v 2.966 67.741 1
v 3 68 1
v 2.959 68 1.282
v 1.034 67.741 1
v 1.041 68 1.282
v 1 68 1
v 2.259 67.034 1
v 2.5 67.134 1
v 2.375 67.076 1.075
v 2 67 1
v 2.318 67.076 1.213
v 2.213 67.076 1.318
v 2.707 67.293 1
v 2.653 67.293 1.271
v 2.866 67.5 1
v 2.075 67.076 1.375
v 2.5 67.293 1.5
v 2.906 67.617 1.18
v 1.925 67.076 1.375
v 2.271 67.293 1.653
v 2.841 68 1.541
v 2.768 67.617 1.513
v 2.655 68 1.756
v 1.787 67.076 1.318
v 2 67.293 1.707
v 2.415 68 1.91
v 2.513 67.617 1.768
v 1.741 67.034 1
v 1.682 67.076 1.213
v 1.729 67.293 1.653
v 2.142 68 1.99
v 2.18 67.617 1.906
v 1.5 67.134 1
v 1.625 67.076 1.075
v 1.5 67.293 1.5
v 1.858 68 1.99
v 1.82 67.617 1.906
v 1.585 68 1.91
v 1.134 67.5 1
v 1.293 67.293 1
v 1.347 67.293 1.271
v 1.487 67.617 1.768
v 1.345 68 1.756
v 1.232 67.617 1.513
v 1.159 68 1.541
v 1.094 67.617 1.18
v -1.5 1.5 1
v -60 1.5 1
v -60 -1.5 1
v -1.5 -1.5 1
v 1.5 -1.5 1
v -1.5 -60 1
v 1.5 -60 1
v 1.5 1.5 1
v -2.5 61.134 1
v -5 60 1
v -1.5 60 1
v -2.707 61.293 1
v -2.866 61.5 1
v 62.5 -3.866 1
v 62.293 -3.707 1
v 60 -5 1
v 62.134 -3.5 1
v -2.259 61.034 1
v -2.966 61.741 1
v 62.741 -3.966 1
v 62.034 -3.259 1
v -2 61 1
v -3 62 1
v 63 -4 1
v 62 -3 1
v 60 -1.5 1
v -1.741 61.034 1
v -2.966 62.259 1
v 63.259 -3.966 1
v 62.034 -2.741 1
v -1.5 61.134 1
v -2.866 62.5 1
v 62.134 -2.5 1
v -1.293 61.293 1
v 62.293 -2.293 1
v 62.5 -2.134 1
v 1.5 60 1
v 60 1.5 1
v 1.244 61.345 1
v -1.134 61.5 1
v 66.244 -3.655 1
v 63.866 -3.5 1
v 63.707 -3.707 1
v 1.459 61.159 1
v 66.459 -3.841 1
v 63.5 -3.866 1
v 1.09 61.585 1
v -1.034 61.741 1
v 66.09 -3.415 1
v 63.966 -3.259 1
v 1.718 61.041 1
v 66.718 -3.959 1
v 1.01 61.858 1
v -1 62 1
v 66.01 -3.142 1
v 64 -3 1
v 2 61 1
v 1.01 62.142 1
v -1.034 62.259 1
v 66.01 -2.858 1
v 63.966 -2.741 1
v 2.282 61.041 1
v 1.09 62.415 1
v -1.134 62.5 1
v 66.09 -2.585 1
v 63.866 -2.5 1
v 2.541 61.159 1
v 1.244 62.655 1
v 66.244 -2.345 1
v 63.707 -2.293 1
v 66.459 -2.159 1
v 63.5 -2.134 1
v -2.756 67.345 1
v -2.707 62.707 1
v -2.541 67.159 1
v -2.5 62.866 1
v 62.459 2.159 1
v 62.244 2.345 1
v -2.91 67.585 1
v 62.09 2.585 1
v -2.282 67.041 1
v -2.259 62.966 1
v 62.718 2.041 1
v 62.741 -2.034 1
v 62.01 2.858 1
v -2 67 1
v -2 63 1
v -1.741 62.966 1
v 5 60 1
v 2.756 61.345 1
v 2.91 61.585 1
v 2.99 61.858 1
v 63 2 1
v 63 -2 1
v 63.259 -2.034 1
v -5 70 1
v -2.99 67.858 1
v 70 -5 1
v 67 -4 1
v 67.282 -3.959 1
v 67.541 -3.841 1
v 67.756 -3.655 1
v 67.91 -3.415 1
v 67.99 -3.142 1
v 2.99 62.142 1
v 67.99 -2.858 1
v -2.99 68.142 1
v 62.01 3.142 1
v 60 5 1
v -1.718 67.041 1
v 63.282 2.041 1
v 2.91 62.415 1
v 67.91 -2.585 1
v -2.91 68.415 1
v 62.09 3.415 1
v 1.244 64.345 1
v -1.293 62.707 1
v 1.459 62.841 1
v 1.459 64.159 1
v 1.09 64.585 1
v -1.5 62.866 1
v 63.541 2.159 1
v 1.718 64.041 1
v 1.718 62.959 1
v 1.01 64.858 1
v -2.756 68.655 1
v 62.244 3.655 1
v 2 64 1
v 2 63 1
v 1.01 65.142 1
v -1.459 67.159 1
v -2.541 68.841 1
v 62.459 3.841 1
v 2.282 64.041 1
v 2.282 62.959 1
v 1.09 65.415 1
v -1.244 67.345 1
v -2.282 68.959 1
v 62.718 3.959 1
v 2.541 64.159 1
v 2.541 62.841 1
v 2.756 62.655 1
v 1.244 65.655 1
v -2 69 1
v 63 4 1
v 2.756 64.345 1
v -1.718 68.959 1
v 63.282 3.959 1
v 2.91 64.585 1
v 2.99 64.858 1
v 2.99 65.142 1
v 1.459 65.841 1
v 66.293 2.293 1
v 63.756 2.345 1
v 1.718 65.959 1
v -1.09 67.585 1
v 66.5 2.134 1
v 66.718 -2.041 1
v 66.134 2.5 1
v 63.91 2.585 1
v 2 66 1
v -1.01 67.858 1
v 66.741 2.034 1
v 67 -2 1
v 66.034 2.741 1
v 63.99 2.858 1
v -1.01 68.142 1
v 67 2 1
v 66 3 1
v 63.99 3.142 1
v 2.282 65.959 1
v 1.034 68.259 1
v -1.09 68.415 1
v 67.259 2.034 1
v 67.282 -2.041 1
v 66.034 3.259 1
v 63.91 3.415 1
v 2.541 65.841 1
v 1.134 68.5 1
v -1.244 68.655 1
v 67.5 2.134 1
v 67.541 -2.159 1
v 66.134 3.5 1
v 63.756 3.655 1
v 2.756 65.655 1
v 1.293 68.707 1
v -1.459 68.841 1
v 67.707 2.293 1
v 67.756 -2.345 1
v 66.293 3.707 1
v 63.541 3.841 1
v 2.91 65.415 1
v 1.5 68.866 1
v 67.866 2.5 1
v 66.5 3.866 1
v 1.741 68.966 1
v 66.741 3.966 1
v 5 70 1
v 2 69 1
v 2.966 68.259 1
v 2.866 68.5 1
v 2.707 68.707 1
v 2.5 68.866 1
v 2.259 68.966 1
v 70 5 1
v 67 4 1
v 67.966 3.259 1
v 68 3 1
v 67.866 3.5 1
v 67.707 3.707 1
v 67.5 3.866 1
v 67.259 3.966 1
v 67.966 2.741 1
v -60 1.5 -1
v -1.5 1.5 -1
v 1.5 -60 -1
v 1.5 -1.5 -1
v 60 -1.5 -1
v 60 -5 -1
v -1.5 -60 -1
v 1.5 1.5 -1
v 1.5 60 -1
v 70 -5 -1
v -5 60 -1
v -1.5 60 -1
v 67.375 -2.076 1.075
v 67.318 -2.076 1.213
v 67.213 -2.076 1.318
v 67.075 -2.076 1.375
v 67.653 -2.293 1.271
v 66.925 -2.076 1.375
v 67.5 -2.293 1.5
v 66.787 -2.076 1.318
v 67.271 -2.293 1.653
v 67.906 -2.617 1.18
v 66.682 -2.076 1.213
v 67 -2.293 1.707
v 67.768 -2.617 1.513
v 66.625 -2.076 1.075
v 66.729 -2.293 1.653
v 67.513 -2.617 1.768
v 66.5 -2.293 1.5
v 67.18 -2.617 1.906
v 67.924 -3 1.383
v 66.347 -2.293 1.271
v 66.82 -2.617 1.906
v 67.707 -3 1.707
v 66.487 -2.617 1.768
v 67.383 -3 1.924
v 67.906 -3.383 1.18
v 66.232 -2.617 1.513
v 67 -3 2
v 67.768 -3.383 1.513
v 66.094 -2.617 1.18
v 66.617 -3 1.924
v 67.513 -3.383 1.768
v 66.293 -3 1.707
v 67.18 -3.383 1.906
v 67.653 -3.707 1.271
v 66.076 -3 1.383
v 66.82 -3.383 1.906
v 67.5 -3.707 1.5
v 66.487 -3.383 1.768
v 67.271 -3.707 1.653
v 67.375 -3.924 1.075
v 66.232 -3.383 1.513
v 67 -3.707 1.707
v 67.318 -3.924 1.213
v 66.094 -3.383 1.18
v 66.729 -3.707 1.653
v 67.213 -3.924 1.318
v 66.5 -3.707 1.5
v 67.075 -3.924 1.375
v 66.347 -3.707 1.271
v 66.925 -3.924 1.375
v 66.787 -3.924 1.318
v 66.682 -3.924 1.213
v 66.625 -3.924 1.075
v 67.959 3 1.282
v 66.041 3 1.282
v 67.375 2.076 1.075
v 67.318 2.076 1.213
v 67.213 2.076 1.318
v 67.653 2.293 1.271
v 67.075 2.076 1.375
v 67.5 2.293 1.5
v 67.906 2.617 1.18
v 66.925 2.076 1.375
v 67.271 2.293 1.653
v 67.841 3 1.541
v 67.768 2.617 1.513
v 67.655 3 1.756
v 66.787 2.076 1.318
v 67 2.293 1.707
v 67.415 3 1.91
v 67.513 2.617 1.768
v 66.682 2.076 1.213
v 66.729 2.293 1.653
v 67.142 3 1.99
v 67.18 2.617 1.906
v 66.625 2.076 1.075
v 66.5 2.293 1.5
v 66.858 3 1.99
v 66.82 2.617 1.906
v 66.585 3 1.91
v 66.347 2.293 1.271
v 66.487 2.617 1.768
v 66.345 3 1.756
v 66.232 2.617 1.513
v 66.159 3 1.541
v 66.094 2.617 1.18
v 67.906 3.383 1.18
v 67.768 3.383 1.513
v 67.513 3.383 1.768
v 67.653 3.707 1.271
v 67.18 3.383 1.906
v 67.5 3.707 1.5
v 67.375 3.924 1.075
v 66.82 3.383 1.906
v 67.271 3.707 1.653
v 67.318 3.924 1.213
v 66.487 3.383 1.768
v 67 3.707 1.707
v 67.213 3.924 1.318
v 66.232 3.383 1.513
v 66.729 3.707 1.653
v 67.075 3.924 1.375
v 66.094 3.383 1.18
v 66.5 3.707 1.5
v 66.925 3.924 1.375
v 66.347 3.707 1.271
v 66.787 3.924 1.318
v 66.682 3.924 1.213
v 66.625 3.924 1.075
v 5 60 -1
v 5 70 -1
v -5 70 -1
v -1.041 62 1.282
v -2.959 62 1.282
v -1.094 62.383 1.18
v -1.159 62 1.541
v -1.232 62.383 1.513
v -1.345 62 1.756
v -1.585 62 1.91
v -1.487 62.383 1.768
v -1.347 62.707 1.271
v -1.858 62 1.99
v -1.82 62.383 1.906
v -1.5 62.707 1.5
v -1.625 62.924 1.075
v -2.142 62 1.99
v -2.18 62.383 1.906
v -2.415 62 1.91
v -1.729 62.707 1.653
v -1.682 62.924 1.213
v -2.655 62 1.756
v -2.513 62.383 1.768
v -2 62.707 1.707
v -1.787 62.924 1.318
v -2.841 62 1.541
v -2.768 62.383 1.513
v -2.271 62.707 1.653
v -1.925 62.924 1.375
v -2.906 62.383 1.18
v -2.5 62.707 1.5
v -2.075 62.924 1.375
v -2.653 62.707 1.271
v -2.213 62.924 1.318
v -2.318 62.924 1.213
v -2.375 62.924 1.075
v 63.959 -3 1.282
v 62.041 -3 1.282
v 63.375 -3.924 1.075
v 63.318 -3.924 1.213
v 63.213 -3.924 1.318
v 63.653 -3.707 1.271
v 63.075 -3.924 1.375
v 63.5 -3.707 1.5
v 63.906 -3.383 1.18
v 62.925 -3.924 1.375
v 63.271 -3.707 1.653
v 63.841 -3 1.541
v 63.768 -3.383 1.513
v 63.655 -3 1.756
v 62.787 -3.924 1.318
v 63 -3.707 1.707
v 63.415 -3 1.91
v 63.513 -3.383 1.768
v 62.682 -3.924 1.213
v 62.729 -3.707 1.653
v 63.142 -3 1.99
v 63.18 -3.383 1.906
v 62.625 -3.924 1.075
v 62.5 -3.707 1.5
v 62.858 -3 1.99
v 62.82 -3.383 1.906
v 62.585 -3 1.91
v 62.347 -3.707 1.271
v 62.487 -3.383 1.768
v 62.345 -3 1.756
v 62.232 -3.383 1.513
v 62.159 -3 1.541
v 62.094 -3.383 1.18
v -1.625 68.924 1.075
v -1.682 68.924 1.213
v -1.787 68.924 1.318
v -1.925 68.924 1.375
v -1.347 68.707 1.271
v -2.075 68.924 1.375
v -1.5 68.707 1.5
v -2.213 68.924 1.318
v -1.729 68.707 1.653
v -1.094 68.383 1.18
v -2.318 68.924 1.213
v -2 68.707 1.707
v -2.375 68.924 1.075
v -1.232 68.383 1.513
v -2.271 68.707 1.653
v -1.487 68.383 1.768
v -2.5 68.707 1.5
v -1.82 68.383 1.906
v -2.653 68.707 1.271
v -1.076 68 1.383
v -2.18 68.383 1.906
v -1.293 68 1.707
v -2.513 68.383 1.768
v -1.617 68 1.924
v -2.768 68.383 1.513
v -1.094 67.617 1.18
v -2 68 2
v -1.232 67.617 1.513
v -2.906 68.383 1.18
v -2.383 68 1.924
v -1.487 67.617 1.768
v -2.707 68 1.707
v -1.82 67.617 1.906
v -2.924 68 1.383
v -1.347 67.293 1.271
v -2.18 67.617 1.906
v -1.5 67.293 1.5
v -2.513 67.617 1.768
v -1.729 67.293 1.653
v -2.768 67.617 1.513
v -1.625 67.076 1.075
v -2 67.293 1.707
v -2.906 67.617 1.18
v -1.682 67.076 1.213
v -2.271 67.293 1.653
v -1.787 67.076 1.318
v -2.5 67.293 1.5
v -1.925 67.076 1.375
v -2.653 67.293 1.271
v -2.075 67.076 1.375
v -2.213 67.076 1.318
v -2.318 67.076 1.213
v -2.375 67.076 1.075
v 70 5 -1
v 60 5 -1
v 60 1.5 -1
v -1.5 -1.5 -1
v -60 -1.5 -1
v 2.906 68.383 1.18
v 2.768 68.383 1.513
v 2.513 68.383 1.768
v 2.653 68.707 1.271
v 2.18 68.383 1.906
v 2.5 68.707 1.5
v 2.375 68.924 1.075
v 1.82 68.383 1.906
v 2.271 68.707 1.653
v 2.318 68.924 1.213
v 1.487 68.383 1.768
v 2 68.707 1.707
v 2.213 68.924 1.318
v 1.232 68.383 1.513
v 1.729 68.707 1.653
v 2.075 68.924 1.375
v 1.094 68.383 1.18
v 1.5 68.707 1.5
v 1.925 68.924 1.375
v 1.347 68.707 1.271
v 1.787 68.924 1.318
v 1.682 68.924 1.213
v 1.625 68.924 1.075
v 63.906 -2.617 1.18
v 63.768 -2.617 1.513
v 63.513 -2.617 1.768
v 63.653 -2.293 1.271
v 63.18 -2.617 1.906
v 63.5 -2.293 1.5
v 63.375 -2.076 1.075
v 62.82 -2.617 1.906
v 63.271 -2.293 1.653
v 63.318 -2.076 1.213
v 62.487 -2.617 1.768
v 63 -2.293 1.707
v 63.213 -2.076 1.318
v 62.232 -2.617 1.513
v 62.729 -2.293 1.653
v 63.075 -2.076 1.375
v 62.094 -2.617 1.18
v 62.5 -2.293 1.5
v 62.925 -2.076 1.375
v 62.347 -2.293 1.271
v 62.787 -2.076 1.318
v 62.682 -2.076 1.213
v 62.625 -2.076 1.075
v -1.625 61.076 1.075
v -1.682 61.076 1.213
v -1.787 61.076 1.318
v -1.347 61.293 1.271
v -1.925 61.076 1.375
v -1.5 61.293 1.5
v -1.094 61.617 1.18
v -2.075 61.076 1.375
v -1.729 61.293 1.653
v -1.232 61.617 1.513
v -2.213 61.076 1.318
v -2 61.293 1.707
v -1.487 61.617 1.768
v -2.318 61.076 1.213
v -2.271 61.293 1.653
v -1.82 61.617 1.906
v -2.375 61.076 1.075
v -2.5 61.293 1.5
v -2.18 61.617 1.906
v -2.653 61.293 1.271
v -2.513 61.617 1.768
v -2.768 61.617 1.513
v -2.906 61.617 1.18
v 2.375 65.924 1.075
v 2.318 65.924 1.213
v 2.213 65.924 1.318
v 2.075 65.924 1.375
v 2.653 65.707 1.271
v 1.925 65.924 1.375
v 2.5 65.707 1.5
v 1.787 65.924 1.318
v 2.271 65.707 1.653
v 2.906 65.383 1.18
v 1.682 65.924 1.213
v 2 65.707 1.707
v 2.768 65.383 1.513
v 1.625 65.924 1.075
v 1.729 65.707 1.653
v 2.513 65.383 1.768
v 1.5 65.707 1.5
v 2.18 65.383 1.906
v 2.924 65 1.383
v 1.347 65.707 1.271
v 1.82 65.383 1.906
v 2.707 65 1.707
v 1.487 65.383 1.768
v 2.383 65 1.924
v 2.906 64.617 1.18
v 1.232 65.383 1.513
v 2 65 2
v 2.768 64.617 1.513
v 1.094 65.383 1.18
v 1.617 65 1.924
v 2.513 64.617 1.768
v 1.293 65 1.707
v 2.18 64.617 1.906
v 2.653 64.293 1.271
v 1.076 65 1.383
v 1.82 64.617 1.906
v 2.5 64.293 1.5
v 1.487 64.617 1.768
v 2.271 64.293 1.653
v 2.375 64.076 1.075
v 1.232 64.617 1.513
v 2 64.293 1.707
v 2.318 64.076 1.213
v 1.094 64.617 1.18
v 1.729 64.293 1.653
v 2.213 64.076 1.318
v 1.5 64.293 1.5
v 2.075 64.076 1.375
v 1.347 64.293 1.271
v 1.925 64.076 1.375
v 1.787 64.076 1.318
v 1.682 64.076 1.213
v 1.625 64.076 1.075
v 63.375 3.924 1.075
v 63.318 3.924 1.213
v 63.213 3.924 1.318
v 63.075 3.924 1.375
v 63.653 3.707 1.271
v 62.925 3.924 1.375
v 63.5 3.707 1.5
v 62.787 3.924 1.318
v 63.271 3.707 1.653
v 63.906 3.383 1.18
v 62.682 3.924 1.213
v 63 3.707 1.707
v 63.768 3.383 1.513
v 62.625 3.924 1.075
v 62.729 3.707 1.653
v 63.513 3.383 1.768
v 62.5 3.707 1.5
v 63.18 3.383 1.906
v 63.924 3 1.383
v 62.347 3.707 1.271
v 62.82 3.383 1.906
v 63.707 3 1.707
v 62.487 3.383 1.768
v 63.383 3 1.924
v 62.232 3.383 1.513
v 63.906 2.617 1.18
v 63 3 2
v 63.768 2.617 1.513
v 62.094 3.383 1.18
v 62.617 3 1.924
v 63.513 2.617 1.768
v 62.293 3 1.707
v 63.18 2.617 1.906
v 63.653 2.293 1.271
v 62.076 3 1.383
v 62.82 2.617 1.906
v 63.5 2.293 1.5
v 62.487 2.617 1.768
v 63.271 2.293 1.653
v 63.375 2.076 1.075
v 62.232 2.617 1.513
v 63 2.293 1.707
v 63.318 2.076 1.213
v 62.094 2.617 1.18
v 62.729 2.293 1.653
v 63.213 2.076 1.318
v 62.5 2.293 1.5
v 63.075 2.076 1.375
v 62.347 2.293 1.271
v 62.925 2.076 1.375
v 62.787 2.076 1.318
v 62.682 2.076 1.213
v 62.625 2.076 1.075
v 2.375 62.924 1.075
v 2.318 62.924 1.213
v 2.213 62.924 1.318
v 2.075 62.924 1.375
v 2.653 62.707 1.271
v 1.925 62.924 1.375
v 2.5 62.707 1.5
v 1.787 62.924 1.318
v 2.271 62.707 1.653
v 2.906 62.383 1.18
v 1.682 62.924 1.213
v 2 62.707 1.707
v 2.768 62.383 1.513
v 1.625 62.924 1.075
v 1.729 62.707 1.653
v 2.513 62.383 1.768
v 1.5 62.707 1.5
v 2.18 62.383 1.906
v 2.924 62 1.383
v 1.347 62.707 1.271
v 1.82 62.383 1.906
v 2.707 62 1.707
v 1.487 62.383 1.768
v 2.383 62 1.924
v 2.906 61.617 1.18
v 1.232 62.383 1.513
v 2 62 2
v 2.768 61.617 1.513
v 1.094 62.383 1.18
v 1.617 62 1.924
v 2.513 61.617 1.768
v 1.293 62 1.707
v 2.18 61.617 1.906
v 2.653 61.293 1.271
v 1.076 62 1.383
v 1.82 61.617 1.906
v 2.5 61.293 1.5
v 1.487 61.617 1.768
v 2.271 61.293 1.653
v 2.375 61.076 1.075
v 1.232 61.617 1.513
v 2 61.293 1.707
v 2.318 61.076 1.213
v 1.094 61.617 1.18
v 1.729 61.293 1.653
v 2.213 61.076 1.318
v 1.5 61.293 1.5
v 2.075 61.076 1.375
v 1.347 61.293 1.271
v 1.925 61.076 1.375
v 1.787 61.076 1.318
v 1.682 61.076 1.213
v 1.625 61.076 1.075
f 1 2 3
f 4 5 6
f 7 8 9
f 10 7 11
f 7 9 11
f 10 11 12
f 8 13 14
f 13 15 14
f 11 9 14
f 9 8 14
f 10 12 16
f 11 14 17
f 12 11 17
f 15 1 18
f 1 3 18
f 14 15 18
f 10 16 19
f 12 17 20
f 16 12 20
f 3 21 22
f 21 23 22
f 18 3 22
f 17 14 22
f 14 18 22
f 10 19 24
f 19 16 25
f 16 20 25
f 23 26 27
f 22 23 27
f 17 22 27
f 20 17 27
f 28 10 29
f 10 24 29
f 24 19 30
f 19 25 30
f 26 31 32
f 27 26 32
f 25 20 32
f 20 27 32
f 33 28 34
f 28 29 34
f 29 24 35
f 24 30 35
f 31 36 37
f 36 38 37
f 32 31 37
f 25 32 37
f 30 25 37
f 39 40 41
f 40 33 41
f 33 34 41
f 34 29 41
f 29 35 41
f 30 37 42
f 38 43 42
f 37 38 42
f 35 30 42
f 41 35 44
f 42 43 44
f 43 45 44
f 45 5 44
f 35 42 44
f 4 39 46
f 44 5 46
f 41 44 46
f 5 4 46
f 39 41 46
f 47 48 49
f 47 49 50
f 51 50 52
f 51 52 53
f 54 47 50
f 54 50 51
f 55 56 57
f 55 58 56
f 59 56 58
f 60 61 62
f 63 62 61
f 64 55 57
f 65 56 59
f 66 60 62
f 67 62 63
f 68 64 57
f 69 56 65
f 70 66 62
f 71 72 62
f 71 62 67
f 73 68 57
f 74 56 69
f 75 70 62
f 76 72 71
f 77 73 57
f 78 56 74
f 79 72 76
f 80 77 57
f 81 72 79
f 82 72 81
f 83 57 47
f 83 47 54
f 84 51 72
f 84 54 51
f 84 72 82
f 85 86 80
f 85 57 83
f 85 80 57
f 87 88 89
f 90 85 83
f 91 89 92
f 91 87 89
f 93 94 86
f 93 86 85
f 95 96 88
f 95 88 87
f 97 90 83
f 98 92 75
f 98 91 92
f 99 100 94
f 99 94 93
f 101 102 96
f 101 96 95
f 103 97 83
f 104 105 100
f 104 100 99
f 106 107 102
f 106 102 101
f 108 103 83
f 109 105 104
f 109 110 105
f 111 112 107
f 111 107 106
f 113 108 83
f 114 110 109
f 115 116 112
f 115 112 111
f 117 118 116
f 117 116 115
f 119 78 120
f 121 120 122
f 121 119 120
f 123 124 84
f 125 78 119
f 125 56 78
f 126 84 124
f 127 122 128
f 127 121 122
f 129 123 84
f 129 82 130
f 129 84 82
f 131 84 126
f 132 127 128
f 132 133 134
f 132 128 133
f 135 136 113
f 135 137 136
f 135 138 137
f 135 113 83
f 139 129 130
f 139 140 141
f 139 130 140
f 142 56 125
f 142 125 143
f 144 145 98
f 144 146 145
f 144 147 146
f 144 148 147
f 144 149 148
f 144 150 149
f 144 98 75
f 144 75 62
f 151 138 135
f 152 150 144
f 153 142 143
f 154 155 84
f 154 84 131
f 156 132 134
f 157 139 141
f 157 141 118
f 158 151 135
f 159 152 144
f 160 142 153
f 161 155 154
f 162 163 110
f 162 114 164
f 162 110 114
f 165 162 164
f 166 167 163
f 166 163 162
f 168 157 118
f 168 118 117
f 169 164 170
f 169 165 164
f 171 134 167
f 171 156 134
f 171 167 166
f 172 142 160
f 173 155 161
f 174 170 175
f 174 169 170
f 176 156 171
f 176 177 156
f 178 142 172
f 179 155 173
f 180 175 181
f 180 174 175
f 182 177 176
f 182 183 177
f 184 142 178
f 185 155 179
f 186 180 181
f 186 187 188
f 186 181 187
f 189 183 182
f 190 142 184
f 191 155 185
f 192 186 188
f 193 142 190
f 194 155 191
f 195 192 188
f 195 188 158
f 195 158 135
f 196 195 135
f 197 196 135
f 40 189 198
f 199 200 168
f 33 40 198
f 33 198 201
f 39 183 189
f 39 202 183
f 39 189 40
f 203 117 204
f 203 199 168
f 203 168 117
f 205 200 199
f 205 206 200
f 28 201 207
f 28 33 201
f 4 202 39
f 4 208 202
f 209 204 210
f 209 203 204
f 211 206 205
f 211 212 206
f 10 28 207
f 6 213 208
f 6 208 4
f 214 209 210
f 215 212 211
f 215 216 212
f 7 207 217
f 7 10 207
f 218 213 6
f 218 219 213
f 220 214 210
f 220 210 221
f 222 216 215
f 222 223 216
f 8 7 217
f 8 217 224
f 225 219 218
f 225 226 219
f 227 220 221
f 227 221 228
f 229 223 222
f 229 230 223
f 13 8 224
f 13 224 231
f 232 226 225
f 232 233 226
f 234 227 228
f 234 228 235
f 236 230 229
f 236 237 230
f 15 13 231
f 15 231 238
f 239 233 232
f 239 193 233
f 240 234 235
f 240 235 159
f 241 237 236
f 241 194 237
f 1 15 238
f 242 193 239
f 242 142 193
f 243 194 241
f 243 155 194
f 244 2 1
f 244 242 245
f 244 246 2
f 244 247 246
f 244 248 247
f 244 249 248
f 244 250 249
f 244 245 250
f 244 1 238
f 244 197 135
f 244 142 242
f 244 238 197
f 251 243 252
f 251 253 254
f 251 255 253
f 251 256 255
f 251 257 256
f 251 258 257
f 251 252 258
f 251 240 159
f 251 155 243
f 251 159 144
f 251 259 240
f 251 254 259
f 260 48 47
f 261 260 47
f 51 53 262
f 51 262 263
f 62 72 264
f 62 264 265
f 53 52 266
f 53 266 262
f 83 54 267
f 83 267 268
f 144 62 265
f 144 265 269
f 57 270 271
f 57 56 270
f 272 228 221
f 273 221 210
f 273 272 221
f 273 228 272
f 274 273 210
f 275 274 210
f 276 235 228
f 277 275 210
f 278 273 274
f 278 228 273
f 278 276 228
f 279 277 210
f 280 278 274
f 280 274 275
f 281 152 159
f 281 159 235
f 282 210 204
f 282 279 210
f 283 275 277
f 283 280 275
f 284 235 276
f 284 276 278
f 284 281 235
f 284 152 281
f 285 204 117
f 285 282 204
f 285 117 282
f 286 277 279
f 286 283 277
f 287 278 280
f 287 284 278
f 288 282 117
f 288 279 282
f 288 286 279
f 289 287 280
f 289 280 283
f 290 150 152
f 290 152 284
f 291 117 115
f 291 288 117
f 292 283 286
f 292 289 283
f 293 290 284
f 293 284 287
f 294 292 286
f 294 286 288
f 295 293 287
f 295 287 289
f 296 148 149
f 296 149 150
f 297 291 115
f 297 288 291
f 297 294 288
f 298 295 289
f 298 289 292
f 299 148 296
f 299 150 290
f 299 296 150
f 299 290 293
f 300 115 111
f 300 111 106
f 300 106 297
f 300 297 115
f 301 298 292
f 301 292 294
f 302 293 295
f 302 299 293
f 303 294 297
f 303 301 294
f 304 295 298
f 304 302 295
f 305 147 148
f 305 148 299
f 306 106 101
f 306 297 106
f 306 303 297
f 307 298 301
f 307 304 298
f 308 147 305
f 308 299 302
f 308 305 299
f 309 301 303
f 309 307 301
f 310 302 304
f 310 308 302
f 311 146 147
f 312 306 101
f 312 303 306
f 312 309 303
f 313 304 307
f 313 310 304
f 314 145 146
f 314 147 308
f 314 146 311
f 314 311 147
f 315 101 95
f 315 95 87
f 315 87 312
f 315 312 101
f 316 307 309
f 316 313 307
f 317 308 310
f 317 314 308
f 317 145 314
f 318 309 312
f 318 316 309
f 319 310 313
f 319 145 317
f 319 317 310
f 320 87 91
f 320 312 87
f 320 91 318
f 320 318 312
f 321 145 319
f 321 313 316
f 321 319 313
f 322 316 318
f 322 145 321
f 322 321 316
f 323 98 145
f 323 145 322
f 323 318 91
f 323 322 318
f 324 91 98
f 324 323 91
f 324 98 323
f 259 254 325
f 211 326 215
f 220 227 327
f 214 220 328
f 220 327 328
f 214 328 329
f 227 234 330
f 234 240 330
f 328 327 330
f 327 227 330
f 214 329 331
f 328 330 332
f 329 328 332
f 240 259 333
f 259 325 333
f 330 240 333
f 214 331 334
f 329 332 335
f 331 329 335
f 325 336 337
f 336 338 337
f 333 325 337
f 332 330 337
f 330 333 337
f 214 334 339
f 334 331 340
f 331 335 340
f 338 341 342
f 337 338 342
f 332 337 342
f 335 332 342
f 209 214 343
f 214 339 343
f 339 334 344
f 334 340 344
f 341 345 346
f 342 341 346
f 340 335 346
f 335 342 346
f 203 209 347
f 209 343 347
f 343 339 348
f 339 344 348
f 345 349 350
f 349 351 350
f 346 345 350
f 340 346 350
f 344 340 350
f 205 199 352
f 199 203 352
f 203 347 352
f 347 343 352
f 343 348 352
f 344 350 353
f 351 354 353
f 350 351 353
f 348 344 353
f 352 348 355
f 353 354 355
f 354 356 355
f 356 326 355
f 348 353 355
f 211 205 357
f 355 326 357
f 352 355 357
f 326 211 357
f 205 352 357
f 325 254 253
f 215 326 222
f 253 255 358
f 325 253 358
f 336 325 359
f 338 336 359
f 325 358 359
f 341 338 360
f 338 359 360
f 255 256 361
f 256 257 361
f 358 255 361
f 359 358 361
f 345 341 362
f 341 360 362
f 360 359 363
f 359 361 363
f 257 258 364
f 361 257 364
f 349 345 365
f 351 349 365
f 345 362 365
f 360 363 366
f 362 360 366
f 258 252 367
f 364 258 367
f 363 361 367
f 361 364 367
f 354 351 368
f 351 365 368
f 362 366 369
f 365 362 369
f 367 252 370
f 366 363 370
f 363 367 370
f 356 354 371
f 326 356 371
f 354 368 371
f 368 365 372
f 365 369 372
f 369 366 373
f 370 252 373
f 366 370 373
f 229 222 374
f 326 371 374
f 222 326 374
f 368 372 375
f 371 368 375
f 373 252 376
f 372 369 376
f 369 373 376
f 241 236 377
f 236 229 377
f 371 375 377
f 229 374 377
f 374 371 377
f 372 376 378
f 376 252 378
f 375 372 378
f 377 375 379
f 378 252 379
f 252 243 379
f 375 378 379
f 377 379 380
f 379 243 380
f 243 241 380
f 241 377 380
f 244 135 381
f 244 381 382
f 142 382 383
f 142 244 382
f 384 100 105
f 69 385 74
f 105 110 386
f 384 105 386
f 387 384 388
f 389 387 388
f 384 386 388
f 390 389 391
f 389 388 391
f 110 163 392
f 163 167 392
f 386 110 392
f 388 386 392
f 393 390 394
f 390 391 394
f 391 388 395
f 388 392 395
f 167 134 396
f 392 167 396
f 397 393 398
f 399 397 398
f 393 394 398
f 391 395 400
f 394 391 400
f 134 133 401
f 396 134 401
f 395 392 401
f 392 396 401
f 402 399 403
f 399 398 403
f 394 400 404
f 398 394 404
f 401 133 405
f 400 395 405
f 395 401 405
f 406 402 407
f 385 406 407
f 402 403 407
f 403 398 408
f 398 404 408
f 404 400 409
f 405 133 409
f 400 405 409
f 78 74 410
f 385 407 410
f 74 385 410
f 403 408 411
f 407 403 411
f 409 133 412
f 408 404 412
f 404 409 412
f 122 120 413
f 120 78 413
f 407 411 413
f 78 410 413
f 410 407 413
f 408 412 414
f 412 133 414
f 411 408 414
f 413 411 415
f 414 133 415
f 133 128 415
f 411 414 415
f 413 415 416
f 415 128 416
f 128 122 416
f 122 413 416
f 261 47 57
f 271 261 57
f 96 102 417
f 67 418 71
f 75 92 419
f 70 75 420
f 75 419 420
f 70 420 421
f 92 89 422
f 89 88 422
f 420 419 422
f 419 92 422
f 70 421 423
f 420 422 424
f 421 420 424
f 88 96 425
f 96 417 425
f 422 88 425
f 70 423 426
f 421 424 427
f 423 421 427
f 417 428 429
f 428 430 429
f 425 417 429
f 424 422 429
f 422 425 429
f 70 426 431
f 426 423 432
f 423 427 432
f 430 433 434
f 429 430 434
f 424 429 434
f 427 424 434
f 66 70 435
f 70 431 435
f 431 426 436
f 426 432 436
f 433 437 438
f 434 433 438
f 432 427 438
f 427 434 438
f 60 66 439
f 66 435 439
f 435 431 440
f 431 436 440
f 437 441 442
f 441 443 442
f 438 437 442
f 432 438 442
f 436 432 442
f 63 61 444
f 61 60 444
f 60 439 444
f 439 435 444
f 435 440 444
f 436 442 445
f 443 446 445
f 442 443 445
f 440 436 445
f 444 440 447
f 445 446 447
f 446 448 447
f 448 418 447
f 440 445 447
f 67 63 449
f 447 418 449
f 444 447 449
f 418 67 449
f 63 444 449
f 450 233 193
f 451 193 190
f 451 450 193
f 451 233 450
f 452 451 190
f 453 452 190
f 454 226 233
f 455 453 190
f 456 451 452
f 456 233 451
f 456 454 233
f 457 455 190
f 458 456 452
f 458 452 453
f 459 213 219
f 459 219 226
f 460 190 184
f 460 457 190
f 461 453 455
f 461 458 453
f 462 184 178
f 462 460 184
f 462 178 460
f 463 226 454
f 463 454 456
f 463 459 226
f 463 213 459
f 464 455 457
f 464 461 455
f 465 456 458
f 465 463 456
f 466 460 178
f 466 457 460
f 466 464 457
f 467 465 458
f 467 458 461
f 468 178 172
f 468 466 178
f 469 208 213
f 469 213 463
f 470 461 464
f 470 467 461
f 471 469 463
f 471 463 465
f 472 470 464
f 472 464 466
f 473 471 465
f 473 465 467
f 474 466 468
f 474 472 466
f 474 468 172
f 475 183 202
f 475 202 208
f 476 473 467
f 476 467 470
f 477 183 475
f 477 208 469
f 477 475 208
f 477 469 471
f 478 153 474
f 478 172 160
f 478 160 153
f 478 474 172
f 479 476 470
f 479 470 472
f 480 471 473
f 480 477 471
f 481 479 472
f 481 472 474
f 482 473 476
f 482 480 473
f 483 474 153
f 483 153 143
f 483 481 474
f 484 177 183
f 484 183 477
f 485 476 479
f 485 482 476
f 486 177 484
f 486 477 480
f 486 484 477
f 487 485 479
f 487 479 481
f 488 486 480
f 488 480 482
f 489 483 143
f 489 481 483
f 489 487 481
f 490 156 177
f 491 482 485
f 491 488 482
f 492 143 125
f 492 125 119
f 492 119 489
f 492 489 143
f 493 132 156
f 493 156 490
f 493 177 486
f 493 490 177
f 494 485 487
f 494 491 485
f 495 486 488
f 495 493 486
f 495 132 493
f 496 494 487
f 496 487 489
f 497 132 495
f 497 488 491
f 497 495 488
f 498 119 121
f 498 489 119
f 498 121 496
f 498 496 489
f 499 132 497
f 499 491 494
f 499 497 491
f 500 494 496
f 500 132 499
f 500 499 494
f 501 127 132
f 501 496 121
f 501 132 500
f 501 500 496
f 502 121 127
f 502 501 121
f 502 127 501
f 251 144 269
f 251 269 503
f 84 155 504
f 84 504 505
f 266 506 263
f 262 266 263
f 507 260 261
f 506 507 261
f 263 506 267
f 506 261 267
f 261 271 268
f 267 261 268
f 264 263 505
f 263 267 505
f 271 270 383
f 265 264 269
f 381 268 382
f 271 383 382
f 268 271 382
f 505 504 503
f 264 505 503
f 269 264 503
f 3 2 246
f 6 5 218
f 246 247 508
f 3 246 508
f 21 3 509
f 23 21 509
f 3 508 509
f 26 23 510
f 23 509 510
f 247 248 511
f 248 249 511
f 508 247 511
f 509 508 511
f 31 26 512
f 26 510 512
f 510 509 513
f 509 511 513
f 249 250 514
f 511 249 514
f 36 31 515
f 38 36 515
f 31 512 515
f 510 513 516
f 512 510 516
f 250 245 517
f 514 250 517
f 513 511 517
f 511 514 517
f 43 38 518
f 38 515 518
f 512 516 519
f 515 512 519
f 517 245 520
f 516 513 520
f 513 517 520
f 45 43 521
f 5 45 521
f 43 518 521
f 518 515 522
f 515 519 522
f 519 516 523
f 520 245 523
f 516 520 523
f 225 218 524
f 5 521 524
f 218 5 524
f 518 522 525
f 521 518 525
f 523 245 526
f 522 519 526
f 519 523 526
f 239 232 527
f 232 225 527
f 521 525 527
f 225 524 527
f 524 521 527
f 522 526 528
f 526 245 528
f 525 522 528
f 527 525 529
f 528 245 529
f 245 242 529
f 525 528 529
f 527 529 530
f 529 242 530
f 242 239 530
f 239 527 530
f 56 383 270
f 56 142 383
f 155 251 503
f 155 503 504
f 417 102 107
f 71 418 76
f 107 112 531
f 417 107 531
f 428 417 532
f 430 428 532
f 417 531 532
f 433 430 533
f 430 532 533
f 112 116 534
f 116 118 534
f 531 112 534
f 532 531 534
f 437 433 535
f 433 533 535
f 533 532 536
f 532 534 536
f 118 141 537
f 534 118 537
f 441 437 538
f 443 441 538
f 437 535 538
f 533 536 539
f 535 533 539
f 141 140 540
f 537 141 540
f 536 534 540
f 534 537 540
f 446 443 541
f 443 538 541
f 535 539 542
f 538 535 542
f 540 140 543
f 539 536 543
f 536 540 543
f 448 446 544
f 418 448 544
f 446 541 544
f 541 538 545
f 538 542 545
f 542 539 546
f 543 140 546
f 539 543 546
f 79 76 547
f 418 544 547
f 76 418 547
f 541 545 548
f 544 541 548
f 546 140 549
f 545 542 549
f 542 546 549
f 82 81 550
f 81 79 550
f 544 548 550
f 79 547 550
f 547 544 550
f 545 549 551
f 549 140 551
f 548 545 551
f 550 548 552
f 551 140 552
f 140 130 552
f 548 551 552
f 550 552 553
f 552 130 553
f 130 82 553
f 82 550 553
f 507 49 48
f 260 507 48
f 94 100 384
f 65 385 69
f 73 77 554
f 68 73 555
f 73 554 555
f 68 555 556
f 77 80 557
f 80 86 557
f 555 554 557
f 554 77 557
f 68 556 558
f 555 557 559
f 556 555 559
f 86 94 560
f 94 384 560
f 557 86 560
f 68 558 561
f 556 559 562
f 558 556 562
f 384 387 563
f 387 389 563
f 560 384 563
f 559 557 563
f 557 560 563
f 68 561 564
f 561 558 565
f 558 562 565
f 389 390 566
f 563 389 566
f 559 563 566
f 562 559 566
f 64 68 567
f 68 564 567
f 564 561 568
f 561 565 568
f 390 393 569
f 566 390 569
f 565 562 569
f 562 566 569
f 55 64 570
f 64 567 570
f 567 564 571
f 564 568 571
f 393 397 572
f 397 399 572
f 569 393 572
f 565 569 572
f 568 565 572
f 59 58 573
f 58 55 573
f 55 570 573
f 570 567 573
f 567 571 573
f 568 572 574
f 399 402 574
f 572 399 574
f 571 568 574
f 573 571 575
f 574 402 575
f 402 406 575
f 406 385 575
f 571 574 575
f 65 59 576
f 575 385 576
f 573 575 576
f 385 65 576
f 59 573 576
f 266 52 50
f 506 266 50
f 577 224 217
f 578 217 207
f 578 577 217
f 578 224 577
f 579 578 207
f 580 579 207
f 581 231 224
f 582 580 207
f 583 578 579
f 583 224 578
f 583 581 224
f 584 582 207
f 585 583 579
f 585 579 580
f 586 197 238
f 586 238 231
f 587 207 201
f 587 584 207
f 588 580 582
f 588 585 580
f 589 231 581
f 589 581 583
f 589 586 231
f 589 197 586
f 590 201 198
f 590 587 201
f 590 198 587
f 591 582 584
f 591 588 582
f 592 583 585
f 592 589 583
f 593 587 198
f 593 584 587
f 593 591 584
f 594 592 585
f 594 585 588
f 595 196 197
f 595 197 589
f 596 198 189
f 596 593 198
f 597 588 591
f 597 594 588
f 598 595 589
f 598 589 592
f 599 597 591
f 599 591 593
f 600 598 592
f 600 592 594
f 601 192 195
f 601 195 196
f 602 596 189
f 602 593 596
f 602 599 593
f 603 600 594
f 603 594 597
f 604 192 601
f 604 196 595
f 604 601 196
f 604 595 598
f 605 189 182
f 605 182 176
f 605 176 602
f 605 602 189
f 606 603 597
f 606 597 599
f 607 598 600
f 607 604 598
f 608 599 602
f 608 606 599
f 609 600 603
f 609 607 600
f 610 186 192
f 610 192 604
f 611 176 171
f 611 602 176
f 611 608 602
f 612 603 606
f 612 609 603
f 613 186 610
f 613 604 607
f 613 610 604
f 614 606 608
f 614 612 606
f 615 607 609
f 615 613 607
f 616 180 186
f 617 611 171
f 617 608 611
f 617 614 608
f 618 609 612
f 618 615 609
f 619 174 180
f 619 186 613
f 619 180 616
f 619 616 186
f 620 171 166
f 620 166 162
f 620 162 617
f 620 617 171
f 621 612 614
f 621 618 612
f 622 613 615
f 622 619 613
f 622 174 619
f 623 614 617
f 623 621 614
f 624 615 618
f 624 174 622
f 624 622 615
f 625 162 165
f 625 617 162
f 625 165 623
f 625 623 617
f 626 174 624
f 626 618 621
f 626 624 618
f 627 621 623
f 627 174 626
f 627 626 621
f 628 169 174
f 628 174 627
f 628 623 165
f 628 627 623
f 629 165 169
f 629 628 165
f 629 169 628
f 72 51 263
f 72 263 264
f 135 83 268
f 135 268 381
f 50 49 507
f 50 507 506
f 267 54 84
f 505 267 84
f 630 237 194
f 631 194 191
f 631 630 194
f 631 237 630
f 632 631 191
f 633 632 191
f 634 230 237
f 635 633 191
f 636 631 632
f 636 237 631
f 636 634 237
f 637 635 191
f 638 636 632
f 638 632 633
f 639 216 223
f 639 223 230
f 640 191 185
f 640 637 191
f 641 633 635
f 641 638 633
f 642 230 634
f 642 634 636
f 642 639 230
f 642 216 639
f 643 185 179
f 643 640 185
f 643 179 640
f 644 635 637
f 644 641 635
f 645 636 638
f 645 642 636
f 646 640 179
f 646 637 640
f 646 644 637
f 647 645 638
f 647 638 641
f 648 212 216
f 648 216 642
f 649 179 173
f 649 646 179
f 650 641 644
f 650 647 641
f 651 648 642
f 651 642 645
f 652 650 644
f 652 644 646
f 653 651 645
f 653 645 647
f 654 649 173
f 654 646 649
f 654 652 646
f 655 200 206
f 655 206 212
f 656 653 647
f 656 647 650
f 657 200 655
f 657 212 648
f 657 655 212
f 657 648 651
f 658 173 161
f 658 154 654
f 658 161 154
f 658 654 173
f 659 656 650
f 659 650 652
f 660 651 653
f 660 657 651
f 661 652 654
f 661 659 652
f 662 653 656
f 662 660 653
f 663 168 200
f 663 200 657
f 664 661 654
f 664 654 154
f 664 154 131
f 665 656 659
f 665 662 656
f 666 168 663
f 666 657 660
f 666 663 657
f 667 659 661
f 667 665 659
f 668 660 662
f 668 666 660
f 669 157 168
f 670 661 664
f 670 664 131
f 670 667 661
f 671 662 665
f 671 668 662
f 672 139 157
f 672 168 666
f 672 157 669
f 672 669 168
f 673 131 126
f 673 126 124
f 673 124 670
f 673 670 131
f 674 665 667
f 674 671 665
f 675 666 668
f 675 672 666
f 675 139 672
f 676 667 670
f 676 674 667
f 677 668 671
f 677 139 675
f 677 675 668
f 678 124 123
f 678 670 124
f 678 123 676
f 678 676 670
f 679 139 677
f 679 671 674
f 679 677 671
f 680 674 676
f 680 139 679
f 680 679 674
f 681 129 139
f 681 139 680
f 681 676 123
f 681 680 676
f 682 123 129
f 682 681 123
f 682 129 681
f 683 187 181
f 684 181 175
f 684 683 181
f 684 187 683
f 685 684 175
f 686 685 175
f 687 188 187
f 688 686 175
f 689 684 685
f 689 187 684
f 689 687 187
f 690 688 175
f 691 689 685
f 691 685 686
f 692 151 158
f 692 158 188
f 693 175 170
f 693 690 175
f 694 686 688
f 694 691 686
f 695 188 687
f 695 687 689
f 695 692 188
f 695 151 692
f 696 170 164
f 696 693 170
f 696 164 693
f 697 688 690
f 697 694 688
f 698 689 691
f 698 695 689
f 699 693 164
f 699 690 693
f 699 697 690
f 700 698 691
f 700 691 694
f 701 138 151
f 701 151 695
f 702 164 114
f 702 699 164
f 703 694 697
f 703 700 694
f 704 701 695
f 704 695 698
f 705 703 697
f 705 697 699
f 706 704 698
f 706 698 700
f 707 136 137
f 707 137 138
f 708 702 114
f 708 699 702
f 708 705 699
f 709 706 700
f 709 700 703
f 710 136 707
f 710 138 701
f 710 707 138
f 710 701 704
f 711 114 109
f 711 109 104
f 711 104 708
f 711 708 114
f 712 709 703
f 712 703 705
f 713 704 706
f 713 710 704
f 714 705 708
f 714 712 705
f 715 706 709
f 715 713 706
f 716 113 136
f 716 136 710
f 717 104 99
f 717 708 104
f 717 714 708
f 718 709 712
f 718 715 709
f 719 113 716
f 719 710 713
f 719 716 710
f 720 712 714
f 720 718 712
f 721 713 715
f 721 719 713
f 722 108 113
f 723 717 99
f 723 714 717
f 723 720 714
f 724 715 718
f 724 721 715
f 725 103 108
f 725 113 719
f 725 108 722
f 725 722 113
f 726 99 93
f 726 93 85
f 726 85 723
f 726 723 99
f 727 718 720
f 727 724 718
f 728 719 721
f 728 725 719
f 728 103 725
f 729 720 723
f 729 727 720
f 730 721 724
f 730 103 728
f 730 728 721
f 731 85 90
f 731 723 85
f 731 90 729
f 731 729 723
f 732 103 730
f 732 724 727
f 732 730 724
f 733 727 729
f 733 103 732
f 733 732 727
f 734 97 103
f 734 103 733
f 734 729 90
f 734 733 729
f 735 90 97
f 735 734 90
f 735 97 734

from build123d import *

# Parameters (mm, degrees)
F0_W     = 3
F0_H     = 58.5
F0_W_2   = 58.5
F0_H_2   = 3
F1_DEPTH = 1


with BuildPart() as f1:
    # F0 (on Top) → F1 (new body, symmetric)
    with BuildSketch(Plane.XY):
        Polygon((-5, 60), (-1.5, 60), (1.5, 60), (5, 60), (5, 70), (-5, 70), align=None)
        with BuildLine():
            ThreePointArc((-2, 61), (-3, 62), (-2, 63))
            ThreePointArc((-2, 63), (-1.2928932188, 62.7071067812), (-1, 62))
            ThreePointArc((-1, 62), (-1.2928932188, 61.2928932188), (-2, 61))
        make_face(mode=Mode.SUBTRACT)
        with BuildLine():
            ThreePointArc((2, 61), (1, 62), (2, 63))
            ThreePointArc((2, 63), (2.7071067812, 62.7071067812), (3, 62))
            ThreePointArc((3, 62), (2.7071067812, 61.2928932188), (2, 61))
        make_face(mode=Mode.SUBTRACT)
        with BuildLine():
            ThreePointArc((2, 64), (1, 65), (2, 66))
            ThreePointArc((2, 66), (2.7071067812, 65.7071067812), (3, 65))
            ThreePointArc((3, 65), (2.7071067812, 64.2928932188), (2, 64))
        make_face(mode=Mode.SUBTRACT)
        with BuildLine():
            ThreePointArc((-2, 69), (-1.2928932188, 68.7071067812), (-1, 68))
            ThreePointArc((-1, 68), (-1.2928932188, 67.2928932188), (-2, 67))
            ThreePointArc((-2, 67), (-3, 68), (-2, 69))
        make_face(mode=Mode.SUBTRACT)
        with BuildLine():
            ThreePointArc((2, 69), (2.7071067812, 68.7071067812), (3, 68))
            ThreePointArc((3, 68), (2.7071067812, 67.2928932188), (2, 67))
            ThreePointArc((2, 67), (1, 68), (2, 69))
        make_face(mode=Mode.SUBTRACT)
        with Locations((0, 30.75)):
            Rectangle(F0_W, F0_H)
        with Locations((30.75, 0)):
            Rectangle(F0_W_2, F0_H_2)
        with Locations((-30.75, 0)):
            Rectangle(F0_W_2, F0_H_2)
        Polygon((60, 5), (60, 1.5), (60, -1.5), (60, -5), (63.5, -5), (66.5, -5), (70, -5), (70, 5), align=None)
        with Locations((0, -30.75)):
            Rectangle(F0_W, F0_H)
        Rectangle(F0_W, F0_H_2)
        with BuildLine():
            ThreePointArc((-1, 62), (-1.2928932188, 62.7071067812), (-2, 63))
            Line((-2, 63), (-2, 61))
            ThreePointArc((-2, 61), (-1.2928932188, 61.2928932188), (-1, 62))
        make_face()
        with BuildLine():
            Line((-2, 61), (-2, 63))
            ThreePointArc((-2, 63), (-3, 62), (-2, 61))
        make_face()
        with BuildLine():
            ThreePointArc((3, 62), (2.7071067812, 62.7071067812), (2, 63))
            Line((2, 63), (2, 61))
            ThreePointArc((2, 61), (2.7071067812, 61.2928932188), (3, 62))
        make_face()
        with BuildLine():
            Line((2, 61), (2, 63))
            ThreePointArc((2, 63), (1, 62), (2, 61))
        make_face()
        with BuildLine():
            Line((-2, 67), (-2, 69))
            ThreePointArc((-2, 69), (-3, 68), (-2, 67))
        make_face()
        with BuildLine():
            ThreePointArc((-2, 67), (-1.2928932188, 67.2928932188), (-1, 68))
            ThreePointArc((-1, 68), (-1.2928932188, 68.7071067812), (-2, 69))
            Line((-2, 69), (-2, 67))
        make_face()
        with BuildLine():
            ThreePointArc((3, 65), (2.7071067812, 65.7071067812), (2, 66))
            Line((2, 66), (2, 64))
            ThreePointArc((2, 64), (2.7071067812, 64.2928932188), (3, 65))
        make_face()
        with BuildLine():
            Line((2, 64), (2, 66))
            ThreePointArc((2, 66), (1, 65), (2, 64))
        make_face()
        with BuildLine():
            Line((2, 67), (2, 69))
            ThreePointArc((2, 69), (1, 68), (2, 67))
        make_face()
        with BuildLine():
            ThreePointArc((2, 67), (2.7071067812, 67.2928932188), (3, 68))
            ThreePointArc((3, 68), (2.7071067812, 68.7071067812), (2, 69))
            Line((2, 69), (2, 67))
        make_face()
    extrude(amount=F1_DEPTH, both=True)

    # F2 (on face) → F3 (revolve)
    with BuildSketch(Plane.XY.offset(1)):
        with BuildLine():
            Line((-2.000000095, 67), (-2.000000095, 69))
            ThreePointArc((-2.000000095, 69), (-3.000000095, 68), (-2.000000095, 67))
        make_face()
        with BuildLine():
            ThreePointArc((-1.000000095, 62), (-1.2928933138, 62.7071067812), (-2.000000095, 63))
            Line((-2.000000095, 63), (-2.000000095, 61))
            ThreePointArc((-2.000000095, 61), (-1.2928933138, 61.2928932188), (-1.000000095, 62))
        make_face()
    revolve(axis=Axis((-2.000000095, 65, 1), (0, -1, 0)))

    # F2 (on face) → F4 (revolve)
    with BuildSketch(Plane.XY.offset(1)):
        with BuildLine():
            ThreePointArc((1.999999905, 67), (2.7071066862, 67.2928932188), (2.999999905, 68))
            ThreePointArc((2.999999905, 68), (2.7071066862, 68.7071067812), (1.999999905, 69))
            Line((1.999999905, 69), (1.999999905, 67))
        make_face()
        with BuildLine():
            Line((1.999999905, 64), (1.999999905, 66))
            ThreePointArc((1.999999905, 66), (0.999999905, 65), (1.999999905, 64))
        make_face()
        with BuildLine():
            Line((1.999999905, 61), (1.999999905, 63))
            ThreePointArc((1.999999905, 63), (0.999999905, 62), (1.999999905, 61))
        make_face()
    revolve(axis=Axis((1.999999905, 65, 1), (0, -1, 0)))

    # F2 (on face) → F5 (revolve)
    with BuildSketch(Plane.XY.offset(1)):
        with BuildLine():
            Line((63, 2), (63, 4))
            ThreePointArc((63, 4), (62, 3), (63, 2))
        make_face()
        with BuildLine():
            ThreePointArc((64, -3), (63.7071067812, -2.2928932188), (63, -2))
            Line((63, -2), (63, -4))
            ThreePointArc((63, -4), (63.7071067812, -3.7071067812), (64, -3))
        make_face()
    revolve(axis=Axis((63, 0, 1), (0, -1, 0)))

    # F2 (on face) → F6 (revolve)
    with BuildSketch(Plane.XY.offset(1)):
        with BuildLine():
            ThreePointArc((67, 2), (67.7071067812, 2.2928932188), (68, 3))
            ThreePointArc((68, 3), (67.7071067812, 3.7071067812), (67, 4))
            Line((67, 4), (67, 2))
        make_face()
        with BuildLine():
            Line((67, -4), (67, -2))
            ThreePointArc((67, -2), (66, -3), (67, -4))
        make_face()
    revolve(axis=Axis((67, 0, 1), (0, -1, 0)))


solid = f1.part
